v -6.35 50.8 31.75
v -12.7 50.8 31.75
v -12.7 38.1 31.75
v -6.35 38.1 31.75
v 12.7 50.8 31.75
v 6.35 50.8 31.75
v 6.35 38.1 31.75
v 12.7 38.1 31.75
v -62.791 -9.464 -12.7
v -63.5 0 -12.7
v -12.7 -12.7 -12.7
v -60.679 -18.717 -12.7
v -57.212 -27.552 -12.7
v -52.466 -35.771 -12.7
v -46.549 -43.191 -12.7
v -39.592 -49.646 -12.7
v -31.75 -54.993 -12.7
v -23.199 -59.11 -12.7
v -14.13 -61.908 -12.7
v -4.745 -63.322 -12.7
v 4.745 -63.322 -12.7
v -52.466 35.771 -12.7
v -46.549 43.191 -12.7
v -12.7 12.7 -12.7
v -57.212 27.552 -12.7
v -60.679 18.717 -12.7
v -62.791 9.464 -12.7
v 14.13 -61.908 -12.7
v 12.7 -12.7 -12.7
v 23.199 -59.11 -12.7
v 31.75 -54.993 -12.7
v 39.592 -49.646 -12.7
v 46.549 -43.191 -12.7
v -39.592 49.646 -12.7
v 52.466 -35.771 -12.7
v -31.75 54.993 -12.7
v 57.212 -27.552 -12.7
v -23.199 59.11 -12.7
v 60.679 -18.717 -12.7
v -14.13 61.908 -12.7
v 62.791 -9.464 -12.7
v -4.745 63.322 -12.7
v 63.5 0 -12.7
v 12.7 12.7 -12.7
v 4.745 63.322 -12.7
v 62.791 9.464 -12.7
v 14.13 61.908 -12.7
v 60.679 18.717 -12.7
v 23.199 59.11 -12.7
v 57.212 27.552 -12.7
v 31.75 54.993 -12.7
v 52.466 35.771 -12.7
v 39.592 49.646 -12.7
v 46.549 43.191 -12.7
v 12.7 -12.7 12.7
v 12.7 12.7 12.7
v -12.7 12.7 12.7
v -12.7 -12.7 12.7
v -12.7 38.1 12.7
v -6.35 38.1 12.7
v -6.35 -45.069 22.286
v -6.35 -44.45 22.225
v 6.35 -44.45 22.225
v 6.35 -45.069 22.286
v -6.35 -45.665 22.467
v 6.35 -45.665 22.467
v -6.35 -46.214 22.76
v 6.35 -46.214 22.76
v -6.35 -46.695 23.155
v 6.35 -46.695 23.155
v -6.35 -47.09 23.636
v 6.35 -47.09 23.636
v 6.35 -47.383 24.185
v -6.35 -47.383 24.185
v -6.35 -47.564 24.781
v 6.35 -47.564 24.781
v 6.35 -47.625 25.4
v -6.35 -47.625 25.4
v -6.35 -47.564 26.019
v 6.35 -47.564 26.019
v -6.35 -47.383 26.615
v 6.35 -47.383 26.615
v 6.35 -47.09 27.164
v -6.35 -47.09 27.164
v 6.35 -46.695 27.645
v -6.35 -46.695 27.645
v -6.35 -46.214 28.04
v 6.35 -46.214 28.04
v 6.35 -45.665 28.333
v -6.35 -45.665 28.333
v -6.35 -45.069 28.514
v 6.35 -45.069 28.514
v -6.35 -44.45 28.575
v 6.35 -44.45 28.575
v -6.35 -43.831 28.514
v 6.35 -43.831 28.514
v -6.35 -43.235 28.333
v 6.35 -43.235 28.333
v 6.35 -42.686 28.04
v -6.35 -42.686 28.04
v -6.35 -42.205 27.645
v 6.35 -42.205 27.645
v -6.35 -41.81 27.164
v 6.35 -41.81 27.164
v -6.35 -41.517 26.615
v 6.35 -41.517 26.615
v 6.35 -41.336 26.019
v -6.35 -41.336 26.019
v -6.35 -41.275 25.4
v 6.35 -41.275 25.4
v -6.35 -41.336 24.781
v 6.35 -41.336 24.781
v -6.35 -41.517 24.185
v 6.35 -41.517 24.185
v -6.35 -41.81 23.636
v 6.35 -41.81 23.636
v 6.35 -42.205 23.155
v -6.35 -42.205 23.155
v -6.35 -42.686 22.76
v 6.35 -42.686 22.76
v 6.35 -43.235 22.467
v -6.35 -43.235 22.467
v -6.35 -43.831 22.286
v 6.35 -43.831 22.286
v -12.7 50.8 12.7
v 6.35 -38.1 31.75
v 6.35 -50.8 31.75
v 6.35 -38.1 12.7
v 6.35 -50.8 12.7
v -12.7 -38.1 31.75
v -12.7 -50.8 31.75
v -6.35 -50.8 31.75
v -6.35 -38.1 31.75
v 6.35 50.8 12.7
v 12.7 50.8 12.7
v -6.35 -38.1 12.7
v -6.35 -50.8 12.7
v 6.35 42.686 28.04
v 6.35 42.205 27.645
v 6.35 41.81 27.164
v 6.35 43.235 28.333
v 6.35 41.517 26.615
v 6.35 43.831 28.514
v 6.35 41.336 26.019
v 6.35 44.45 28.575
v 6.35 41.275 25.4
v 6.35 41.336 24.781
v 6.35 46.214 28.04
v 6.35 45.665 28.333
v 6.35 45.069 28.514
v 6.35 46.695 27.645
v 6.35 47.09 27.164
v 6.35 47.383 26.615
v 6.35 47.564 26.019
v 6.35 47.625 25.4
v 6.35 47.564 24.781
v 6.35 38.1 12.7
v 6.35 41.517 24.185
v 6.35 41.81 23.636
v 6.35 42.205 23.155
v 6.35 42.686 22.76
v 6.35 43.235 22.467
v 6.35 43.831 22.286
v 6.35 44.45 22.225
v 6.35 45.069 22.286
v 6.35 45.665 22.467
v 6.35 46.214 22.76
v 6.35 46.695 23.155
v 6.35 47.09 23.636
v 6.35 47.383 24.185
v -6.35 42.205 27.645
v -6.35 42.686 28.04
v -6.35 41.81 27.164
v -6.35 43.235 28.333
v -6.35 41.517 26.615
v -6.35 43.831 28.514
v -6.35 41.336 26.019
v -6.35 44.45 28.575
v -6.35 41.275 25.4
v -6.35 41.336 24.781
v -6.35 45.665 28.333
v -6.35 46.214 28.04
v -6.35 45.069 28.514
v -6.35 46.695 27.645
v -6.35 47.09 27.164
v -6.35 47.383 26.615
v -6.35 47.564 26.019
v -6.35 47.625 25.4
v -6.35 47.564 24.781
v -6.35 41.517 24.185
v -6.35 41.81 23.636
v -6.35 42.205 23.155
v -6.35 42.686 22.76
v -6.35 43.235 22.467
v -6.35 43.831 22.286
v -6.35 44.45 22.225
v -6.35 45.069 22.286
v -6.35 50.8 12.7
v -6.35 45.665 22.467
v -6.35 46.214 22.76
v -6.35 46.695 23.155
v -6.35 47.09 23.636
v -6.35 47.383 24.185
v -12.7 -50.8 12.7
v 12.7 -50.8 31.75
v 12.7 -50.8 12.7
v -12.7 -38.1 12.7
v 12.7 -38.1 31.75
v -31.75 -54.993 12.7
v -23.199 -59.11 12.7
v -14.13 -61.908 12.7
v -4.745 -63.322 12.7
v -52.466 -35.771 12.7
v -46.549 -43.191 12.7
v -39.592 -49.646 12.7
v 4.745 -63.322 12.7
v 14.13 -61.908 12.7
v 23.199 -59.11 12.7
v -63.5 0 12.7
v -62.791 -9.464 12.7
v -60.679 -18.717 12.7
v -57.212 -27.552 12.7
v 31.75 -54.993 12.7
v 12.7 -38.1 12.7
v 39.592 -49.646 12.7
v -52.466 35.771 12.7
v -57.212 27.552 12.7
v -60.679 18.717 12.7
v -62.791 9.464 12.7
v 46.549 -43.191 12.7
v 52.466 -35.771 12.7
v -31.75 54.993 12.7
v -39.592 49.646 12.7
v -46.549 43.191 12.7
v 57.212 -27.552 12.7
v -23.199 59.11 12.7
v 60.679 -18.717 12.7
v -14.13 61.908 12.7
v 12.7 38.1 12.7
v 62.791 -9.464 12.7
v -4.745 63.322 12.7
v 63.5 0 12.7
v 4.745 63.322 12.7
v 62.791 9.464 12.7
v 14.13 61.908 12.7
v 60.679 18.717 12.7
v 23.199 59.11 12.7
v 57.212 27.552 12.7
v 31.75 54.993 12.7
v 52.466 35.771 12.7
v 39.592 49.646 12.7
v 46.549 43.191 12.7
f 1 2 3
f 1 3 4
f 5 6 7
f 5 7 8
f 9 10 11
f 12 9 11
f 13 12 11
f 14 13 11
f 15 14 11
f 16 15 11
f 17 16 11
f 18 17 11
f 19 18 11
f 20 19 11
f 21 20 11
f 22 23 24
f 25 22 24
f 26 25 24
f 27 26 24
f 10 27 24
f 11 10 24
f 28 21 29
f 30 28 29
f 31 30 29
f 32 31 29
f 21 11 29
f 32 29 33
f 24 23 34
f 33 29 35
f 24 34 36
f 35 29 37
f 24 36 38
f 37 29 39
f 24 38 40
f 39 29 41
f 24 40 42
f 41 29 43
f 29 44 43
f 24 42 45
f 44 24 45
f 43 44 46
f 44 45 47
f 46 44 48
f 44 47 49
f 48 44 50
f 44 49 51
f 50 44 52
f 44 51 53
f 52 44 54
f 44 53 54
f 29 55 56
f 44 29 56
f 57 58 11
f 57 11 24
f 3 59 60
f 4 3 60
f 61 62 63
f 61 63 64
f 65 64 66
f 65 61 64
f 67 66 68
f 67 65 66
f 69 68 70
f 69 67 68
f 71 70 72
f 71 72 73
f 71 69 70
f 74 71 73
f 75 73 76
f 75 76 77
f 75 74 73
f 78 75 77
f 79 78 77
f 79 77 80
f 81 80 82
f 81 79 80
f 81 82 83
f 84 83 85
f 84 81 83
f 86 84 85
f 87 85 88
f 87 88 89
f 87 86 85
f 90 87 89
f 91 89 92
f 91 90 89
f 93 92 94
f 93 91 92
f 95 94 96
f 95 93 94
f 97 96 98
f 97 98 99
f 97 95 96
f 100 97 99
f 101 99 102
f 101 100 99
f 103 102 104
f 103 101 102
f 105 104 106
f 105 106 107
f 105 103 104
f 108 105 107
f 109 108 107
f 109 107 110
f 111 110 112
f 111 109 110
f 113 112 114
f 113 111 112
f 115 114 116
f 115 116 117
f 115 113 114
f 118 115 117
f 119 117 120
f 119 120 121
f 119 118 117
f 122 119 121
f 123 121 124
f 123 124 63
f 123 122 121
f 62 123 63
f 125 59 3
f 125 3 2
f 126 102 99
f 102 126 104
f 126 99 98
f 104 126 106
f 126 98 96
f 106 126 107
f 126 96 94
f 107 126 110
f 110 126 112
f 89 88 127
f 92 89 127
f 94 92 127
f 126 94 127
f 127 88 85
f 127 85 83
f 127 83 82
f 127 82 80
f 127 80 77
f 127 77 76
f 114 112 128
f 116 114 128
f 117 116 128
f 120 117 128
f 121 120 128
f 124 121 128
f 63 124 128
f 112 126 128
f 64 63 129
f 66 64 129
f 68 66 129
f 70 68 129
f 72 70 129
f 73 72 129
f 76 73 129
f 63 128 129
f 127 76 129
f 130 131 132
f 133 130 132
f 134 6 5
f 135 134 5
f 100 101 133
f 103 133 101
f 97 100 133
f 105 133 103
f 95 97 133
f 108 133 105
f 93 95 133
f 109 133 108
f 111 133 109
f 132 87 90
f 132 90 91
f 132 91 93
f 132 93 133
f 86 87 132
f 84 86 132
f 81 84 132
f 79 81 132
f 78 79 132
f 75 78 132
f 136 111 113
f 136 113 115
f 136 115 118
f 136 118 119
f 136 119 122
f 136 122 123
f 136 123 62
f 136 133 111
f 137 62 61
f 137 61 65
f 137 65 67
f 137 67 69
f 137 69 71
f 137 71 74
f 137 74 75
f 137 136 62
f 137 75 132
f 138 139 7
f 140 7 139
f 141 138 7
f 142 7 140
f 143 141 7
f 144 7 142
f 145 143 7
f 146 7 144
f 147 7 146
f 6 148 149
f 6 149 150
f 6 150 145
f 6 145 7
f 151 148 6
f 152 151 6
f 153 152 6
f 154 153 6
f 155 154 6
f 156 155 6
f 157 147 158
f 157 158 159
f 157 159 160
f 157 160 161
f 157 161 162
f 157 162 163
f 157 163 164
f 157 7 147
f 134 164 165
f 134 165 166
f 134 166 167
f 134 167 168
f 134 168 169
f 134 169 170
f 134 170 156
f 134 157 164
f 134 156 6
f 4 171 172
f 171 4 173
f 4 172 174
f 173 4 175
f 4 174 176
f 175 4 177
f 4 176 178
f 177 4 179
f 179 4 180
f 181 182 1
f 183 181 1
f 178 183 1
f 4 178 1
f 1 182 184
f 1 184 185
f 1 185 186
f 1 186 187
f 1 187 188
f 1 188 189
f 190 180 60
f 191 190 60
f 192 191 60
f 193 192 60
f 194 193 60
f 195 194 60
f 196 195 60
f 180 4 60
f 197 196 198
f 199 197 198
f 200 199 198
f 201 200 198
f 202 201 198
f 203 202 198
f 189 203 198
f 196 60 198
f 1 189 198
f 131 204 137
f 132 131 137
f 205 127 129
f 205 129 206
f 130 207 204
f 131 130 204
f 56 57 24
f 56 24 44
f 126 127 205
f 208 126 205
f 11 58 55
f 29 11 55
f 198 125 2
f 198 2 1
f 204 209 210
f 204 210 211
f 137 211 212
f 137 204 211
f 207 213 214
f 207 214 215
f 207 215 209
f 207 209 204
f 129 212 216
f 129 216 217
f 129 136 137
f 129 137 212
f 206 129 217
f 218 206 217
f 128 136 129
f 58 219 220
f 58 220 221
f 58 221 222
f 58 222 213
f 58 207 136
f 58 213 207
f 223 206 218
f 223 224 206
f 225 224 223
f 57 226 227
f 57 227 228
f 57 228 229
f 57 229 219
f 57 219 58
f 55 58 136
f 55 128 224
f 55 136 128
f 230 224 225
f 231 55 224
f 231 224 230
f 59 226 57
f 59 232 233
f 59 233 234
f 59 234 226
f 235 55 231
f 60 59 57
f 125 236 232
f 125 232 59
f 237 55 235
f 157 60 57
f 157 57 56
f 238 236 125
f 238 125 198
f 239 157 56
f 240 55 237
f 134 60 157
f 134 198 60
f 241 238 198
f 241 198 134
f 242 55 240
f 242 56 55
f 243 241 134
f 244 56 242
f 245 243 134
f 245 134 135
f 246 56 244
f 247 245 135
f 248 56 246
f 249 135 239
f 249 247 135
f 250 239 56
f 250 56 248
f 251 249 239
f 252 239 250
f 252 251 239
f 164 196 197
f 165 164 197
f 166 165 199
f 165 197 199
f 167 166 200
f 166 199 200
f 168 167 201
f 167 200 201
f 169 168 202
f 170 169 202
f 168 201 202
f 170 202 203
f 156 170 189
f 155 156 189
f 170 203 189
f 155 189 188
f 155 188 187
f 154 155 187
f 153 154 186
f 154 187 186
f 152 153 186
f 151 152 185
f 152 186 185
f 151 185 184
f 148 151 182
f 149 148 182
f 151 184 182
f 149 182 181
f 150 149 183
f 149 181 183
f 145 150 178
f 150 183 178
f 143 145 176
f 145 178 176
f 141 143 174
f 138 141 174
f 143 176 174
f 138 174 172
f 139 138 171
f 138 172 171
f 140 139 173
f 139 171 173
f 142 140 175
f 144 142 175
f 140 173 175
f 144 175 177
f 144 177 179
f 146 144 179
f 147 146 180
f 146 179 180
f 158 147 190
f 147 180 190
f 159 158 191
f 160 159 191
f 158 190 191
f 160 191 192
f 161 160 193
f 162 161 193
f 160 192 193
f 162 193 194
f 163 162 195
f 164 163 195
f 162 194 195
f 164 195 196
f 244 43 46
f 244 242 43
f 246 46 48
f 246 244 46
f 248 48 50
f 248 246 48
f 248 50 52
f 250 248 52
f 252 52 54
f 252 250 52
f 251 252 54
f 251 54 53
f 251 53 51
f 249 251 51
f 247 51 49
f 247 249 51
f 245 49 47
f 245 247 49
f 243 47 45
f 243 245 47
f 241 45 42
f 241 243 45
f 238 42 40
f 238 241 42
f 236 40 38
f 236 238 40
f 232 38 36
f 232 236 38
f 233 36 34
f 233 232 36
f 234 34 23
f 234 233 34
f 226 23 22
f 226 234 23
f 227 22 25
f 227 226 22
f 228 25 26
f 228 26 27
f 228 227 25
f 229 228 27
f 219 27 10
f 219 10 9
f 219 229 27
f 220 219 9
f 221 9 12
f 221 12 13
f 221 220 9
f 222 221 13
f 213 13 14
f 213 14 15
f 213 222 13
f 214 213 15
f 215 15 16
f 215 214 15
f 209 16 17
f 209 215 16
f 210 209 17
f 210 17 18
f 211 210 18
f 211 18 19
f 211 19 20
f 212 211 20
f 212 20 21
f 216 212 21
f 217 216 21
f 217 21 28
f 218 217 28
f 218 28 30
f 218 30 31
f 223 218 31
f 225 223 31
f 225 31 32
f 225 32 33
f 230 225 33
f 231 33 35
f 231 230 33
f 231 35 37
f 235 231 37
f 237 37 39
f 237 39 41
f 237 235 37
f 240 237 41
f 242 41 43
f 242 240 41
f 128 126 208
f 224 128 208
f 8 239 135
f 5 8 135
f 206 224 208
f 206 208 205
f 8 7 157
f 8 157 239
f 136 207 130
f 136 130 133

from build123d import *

# Parameters (mm, degrees)
SKETCH1_R           = 63.5
BOSS_EXTRUDE1_DEPTH = 12.7
SKETCH3_W           = 6.35
SKETCH3_H           = 12.7
BOSS_EXTRUDE2_DEPTH = 19.05
SKETCH4_R           = 3.175
BOSS_EXTRUDE3_DEPTH = 12.7
SKETCH5_W           = 25.4
SKETCH5_H           = 25.4
CUT_EXTRUDE1_DEPTH  = 26.4


with BuildPart() as part:
    # Sketch1 → Boss-Extrude1 (new body, symmetric)
    with BuildSketch(Plane.XY):
        Circle(SKETCH1_R)
    extrude(amount=BOSS_EXTRUDE1_DEPTH, both=True)

    # Sketch3 → Boss-Extrude2 (add)
    with BuildSketch(Plane.XY.offset(12.7)):
        with Locations((-9.525, 44.45)):
            Rectangle(SKETCH3_W, SKETCH3_H)
        with Locations((9.525, 44.45)):
            Rectangle(SKETCH3_W, SKETCH3_H)
    boss_extrude2 = extrude(amount=BOSS_EXTRUDE2_DEPTH)

    # Sketch4 → Boss-Extrude3 (add)
    with BuildSketch(Plane(origin=(-6.35, 0, 0), x_dir=(0, 0, -1), z_dir=(1, 0, 0))):
        with Locations((-25.4, 44.45)):
            Circle(SKETCH4_R)
    boss_extrude3 = extrude(amount=BOSS_EXTRUDE3_DEPTH)

    # Mirror1: Boss-Extrude2, Boss-Extrude3 across plane
    add(boss_extrude2.mirror(Plane.ZX))
    add(boss_extrude3.mirror(Plane.ZX))

    # Sketch5 → Cut-Extrude1 (cut, through all)
    with BuildSketch(Plane.XY.offset(12.7)):
        Rectangle(SKETCH5_W, SKETCH5_H)
    extrude(amount=-CUT_EXTRUDE1_DEPTH, mode=Mode.SUBTRACT)


solid = part.part
